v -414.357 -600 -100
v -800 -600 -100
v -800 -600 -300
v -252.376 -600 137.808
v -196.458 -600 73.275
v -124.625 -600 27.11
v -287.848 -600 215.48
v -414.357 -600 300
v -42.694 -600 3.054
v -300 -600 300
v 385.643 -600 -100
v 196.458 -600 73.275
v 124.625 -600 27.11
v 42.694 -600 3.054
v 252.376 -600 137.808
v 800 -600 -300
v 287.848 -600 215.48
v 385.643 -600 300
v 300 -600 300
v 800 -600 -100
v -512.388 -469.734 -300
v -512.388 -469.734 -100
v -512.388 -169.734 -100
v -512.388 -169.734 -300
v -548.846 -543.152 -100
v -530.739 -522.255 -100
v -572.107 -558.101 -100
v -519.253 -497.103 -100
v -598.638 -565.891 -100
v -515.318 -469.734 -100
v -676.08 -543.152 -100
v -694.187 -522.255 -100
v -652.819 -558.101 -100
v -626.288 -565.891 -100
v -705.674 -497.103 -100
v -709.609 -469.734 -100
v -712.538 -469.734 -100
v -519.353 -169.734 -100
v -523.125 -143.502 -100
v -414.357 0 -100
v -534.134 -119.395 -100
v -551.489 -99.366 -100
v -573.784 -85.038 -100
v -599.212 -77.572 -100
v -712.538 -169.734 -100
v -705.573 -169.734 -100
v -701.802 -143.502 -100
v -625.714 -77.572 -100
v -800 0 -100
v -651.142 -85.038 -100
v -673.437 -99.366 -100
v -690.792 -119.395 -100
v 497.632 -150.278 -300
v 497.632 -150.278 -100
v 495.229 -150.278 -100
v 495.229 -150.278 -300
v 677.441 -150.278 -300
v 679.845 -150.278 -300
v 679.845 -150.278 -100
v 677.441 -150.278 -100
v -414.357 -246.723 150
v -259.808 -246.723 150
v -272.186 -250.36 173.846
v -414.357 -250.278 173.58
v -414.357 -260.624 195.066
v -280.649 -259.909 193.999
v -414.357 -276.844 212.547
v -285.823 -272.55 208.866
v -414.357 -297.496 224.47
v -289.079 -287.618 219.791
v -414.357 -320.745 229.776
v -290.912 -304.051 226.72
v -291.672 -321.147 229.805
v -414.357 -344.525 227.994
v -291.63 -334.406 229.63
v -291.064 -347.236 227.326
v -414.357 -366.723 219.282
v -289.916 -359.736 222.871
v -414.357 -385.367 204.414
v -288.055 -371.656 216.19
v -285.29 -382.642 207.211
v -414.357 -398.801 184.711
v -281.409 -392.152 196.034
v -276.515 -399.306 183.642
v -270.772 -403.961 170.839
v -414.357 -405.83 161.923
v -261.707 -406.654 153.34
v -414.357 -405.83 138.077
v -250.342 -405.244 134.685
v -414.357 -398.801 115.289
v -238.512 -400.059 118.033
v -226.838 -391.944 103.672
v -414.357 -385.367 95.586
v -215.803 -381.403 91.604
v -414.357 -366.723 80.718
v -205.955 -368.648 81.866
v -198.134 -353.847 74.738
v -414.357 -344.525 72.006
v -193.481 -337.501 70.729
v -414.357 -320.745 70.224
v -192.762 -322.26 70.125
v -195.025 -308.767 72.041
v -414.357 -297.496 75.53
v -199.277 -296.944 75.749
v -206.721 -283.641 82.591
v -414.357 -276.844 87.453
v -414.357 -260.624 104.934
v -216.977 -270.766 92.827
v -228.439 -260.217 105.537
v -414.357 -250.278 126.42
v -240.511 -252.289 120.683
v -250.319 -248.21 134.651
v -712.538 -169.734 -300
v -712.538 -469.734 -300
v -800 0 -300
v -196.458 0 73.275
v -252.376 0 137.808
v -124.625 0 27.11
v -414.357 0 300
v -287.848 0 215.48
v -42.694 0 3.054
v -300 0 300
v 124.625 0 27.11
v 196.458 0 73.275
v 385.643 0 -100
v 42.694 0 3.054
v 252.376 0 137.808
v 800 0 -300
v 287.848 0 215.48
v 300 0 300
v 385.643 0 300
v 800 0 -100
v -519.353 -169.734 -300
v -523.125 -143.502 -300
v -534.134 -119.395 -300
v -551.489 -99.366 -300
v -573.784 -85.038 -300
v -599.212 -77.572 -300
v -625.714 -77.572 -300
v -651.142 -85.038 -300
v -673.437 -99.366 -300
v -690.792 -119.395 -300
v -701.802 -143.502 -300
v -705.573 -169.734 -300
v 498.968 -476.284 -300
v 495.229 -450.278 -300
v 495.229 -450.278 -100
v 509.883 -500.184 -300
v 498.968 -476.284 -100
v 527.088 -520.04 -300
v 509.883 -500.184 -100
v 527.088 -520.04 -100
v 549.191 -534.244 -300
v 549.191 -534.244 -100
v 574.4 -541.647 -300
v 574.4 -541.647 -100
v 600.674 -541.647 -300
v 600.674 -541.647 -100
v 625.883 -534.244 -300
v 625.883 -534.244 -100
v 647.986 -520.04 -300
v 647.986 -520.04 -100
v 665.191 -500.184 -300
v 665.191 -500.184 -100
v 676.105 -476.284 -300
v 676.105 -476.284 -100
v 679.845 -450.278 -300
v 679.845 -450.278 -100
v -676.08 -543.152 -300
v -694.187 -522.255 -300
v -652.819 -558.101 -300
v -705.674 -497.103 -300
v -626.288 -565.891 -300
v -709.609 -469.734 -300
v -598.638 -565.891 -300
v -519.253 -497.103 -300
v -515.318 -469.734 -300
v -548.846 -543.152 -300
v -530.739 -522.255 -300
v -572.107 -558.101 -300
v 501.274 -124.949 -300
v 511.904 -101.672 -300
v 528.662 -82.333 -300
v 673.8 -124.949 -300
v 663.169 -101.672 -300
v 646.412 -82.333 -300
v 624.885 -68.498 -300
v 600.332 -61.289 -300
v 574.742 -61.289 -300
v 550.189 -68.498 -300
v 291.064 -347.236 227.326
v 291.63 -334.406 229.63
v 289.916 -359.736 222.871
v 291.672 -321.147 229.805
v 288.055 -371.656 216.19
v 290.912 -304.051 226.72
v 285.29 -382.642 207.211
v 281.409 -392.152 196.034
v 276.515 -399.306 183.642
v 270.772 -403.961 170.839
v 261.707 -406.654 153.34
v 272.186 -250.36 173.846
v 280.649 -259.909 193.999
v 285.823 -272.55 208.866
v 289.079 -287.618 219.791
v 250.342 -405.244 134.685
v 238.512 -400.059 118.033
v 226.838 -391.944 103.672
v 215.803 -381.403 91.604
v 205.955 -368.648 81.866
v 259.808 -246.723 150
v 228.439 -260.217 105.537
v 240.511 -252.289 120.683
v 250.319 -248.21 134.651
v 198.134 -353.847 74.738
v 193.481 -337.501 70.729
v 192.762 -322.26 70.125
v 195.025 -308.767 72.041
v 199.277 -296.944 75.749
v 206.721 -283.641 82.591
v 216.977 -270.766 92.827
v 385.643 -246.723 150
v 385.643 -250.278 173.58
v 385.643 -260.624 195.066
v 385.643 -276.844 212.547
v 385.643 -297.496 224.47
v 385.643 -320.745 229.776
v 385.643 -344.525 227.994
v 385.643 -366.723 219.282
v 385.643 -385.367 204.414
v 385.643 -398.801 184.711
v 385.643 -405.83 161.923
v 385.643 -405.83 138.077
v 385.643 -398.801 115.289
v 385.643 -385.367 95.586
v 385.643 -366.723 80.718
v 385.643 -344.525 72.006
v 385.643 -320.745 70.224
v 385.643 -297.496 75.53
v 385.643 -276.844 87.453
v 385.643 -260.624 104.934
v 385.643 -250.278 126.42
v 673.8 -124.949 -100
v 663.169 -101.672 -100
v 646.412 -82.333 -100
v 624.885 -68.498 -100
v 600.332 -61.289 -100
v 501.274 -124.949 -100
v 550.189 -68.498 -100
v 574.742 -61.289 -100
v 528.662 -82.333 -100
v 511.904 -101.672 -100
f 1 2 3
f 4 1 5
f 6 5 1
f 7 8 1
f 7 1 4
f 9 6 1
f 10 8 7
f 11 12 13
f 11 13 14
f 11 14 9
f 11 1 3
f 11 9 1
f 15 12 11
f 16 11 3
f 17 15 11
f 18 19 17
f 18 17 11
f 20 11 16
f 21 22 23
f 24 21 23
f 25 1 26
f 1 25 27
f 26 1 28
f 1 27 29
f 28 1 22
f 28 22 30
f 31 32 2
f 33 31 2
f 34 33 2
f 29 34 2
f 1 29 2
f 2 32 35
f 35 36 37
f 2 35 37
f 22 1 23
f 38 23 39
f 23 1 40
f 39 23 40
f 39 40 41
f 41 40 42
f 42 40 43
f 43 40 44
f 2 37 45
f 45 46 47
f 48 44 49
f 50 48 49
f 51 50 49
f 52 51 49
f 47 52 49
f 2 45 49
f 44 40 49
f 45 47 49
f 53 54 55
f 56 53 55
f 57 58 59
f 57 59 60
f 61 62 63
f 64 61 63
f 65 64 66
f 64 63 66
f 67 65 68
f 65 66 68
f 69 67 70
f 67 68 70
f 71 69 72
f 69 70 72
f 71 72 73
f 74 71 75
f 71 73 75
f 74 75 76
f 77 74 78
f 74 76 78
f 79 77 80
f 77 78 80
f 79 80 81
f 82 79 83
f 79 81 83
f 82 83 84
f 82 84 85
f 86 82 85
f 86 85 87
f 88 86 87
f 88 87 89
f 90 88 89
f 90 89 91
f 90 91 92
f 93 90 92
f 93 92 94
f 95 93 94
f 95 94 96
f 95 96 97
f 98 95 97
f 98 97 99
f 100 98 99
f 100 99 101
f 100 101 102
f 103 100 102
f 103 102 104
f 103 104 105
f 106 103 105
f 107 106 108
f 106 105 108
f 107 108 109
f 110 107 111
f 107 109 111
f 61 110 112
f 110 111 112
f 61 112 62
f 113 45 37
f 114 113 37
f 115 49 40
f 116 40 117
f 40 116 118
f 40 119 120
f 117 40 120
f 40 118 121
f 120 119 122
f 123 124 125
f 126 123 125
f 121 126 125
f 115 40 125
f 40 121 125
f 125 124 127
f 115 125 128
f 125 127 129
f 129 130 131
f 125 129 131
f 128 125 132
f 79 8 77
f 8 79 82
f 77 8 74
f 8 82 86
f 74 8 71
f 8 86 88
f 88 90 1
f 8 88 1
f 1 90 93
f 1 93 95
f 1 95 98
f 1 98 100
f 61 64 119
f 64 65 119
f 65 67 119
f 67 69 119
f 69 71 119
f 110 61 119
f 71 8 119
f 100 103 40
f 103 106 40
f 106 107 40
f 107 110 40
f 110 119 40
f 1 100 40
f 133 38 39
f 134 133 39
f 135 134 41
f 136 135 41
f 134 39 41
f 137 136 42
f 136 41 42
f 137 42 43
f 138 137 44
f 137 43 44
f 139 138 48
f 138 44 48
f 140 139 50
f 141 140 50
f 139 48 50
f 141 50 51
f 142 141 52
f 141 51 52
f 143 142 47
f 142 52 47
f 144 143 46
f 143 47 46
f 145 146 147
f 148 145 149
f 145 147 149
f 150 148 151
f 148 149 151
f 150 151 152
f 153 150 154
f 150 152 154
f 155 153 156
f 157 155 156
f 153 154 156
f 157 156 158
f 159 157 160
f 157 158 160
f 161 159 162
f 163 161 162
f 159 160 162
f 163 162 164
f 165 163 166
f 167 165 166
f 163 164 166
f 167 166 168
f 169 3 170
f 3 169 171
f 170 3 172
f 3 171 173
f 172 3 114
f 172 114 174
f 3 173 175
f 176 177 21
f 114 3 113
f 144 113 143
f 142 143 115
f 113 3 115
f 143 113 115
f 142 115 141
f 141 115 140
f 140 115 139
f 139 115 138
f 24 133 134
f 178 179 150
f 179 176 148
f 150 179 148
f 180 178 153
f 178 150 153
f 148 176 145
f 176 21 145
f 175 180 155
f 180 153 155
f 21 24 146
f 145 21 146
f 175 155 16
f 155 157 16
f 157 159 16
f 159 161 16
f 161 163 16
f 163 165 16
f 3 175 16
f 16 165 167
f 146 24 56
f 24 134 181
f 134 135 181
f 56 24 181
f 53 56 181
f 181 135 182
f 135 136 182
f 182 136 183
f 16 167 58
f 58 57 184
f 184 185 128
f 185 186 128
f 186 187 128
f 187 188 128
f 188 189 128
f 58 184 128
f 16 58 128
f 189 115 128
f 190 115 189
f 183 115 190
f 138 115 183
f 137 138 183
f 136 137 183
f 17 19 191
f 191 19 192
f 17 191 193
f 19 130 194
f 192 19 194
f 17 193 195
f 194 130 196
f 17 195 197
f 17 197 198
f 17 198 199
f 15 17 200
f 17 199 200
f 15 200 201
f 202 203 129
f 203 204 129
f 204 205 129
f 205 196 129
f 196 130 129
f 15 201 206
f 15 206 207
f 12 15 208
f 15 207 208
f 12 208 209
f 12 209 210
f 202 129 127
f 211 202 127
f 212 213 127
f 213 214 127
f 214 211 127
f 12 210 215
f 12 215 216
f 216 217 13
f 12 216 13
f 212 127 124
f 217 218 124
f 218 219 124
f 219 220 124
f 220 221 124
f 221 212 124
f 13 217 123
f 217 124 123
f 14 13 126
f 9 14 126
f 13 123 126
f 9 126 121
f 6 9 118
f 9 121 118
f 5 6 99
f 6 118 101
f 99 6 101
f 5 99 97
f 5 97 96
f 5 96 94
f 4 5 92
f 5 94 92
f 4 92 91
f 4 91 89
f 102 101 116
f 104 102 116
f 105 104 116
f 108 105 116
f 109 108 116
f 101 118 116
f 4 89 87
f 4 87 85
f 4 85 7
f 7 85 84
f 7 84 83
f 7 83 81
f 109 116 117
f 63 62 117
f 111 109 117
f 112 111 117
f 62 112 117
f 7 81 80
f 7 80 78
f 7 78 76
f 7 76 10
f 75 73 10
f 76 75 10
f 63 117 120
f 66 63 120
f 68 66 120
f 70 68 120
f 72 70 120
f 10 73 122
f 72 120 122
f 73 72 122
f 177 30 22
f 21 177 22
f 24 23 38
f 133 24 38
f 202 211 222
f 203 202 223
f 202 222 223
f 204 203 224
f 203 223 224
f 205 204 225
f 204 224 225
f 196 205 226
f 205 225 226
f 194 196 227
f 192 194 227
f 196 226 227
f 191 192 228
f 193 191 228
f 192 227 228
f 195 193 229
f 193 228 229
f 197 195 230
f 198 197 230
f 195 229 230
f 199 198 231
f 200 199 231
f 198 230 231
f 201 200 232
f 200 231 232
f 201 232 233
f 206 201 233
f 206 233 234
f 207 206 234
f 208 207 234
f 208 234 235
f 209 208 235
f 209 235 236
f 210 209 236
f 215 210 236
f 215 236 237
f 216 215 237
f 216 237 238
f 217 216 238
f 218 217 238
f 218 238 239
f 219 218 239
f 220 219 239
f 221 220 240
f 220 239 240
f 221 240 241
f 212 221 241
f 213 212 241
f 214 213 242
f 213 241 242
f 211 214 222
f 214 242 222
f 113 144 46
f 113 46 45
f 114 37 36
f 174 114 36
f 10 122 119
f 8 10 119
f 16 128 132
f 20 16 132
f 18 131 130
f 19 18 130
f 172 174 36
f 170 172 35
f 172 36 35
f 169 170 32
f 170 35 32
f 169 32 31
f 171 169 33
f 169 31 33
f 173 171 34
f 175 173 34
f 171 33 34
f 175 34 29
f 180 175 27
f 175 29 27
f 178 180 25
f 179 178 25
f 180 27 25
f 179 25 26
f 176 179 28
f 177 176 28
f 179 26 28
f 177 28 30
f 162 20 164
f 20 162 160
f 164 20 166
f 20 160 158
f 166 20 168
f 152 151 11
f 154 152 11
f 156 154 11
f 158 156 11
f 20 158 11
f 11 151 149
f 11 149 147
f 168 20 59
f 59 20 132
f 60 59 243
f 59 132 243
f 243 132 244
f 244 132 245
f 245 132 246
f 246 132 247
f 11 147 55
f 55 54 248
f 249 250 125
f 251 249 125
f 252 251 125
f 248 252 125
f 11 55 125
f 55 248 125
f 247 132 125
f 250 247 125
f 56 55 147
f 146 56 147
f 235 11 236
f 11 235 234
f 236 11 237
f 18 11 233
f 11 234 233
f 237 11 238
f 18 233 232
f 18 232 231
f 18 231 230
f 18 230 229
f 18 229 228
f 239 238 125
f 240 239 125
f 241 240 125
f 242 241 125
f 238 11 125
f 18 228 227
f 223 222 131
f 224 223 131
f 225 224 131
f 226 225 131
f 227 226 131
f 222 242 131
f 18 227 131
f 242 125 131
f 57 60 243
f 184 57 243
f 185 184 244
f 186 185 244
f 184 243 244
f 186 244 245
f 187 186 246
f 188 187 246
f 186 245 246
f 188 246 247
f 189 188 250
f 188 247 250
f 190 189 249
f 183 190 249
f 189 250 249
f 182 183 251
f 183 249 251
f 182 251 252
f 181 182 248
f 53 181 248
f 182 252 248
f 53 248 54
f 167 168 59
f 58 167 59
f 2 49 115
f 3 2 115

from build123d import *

# Parameters (mm, degrees)
F1_DEPTH = 600
F2_R     = 80
F3_DEPTH = 1185.644113
F6_DEPTH = 200.001


with BuildPart() as f1:
    # F0 (on Front) → F1 (new body)
    with BuildSketch(Plane.XZ):
        with BuildLine():
            Line((-800, -300), (800, -300))
            Line((800, -300), (800, -100))
            Line((800, -100), (385.643113, -100))
            Line((385.643113, -100), (385.643113, 300))
            Line((385.643113, 300), (300, 300))
            ThreePointArc((300, 300), (0, 0), (-300, 300))
            Line((-300, 300), (-414.356887, 300))
            Line((-414.356887, 300), (-414.356887, -100))
            Line((-414.356887, -100), (-800, -100))
            Line((-800, -100), (-800, -300))
        make_face()
    extrude(amount=F1_DEPTH)

    # F2 (on face) → F3 (cut, through all)
    with BuildSketch(Plane.YZ.offset(385.643113)):
        with Locations((-326.723337, 150)):
            Circle(F2_R)
    extrude(amount=-F3_DEPTH, mode=Mode.SUBTRACT)

    # F5 (on face) → F6 (cut, through all)
    with BuildSketch(Plane.XY.offset(-100)):
        with BuildLine():
            Line((679.844578, -450.278306), (679.844578, -150.278306))
            Line((679.844578, -150.278306), (677.441342, -150.278306))
            ThreePointArc((677.441342, -150.278306), (587.536824, -60.373787), (497.632305, -150.278306))
            Line((497.632305, -150.278306), (495.22907, -150.278306))
            Line((495.22907, -150.278306), (495.22907, -450.278306))
            ThreePointArc((495.22907, -450.278306), (587.536824, -542.58606), (679.844578, -450.278306))
        make_face()
        with BuildLine():
            Line((-512.387931, -469.733909), (-512.387931, -169.733909))
            Line((-512.387931, -169.733909), (-519.35312, -169.733909))
            ThreePointArc((-519.35312, -169.733909), (-612.463176, -76.623852), (-705.573233, -169.733909))
            Line((-705.573233, -169.733909), (-712.538421, -169.733909))
            Line((-712.538421, -169.733909), (-712.538421, -469.733909))
            Line((-712.538421, -469.733909), (-709.608744, -469.733909))
            ThreePointArc((-709.608744, -469.733909), (-612.463176, -566.879477), (-515.317608, -469.733909))
            Line((-515.317608, -469.733909), (-512.387931, -469.733909))
        make_face()
    extrude(amount=-F6_DEPTH, mode=Mode.SUBTRACT)


solid = f1.part
